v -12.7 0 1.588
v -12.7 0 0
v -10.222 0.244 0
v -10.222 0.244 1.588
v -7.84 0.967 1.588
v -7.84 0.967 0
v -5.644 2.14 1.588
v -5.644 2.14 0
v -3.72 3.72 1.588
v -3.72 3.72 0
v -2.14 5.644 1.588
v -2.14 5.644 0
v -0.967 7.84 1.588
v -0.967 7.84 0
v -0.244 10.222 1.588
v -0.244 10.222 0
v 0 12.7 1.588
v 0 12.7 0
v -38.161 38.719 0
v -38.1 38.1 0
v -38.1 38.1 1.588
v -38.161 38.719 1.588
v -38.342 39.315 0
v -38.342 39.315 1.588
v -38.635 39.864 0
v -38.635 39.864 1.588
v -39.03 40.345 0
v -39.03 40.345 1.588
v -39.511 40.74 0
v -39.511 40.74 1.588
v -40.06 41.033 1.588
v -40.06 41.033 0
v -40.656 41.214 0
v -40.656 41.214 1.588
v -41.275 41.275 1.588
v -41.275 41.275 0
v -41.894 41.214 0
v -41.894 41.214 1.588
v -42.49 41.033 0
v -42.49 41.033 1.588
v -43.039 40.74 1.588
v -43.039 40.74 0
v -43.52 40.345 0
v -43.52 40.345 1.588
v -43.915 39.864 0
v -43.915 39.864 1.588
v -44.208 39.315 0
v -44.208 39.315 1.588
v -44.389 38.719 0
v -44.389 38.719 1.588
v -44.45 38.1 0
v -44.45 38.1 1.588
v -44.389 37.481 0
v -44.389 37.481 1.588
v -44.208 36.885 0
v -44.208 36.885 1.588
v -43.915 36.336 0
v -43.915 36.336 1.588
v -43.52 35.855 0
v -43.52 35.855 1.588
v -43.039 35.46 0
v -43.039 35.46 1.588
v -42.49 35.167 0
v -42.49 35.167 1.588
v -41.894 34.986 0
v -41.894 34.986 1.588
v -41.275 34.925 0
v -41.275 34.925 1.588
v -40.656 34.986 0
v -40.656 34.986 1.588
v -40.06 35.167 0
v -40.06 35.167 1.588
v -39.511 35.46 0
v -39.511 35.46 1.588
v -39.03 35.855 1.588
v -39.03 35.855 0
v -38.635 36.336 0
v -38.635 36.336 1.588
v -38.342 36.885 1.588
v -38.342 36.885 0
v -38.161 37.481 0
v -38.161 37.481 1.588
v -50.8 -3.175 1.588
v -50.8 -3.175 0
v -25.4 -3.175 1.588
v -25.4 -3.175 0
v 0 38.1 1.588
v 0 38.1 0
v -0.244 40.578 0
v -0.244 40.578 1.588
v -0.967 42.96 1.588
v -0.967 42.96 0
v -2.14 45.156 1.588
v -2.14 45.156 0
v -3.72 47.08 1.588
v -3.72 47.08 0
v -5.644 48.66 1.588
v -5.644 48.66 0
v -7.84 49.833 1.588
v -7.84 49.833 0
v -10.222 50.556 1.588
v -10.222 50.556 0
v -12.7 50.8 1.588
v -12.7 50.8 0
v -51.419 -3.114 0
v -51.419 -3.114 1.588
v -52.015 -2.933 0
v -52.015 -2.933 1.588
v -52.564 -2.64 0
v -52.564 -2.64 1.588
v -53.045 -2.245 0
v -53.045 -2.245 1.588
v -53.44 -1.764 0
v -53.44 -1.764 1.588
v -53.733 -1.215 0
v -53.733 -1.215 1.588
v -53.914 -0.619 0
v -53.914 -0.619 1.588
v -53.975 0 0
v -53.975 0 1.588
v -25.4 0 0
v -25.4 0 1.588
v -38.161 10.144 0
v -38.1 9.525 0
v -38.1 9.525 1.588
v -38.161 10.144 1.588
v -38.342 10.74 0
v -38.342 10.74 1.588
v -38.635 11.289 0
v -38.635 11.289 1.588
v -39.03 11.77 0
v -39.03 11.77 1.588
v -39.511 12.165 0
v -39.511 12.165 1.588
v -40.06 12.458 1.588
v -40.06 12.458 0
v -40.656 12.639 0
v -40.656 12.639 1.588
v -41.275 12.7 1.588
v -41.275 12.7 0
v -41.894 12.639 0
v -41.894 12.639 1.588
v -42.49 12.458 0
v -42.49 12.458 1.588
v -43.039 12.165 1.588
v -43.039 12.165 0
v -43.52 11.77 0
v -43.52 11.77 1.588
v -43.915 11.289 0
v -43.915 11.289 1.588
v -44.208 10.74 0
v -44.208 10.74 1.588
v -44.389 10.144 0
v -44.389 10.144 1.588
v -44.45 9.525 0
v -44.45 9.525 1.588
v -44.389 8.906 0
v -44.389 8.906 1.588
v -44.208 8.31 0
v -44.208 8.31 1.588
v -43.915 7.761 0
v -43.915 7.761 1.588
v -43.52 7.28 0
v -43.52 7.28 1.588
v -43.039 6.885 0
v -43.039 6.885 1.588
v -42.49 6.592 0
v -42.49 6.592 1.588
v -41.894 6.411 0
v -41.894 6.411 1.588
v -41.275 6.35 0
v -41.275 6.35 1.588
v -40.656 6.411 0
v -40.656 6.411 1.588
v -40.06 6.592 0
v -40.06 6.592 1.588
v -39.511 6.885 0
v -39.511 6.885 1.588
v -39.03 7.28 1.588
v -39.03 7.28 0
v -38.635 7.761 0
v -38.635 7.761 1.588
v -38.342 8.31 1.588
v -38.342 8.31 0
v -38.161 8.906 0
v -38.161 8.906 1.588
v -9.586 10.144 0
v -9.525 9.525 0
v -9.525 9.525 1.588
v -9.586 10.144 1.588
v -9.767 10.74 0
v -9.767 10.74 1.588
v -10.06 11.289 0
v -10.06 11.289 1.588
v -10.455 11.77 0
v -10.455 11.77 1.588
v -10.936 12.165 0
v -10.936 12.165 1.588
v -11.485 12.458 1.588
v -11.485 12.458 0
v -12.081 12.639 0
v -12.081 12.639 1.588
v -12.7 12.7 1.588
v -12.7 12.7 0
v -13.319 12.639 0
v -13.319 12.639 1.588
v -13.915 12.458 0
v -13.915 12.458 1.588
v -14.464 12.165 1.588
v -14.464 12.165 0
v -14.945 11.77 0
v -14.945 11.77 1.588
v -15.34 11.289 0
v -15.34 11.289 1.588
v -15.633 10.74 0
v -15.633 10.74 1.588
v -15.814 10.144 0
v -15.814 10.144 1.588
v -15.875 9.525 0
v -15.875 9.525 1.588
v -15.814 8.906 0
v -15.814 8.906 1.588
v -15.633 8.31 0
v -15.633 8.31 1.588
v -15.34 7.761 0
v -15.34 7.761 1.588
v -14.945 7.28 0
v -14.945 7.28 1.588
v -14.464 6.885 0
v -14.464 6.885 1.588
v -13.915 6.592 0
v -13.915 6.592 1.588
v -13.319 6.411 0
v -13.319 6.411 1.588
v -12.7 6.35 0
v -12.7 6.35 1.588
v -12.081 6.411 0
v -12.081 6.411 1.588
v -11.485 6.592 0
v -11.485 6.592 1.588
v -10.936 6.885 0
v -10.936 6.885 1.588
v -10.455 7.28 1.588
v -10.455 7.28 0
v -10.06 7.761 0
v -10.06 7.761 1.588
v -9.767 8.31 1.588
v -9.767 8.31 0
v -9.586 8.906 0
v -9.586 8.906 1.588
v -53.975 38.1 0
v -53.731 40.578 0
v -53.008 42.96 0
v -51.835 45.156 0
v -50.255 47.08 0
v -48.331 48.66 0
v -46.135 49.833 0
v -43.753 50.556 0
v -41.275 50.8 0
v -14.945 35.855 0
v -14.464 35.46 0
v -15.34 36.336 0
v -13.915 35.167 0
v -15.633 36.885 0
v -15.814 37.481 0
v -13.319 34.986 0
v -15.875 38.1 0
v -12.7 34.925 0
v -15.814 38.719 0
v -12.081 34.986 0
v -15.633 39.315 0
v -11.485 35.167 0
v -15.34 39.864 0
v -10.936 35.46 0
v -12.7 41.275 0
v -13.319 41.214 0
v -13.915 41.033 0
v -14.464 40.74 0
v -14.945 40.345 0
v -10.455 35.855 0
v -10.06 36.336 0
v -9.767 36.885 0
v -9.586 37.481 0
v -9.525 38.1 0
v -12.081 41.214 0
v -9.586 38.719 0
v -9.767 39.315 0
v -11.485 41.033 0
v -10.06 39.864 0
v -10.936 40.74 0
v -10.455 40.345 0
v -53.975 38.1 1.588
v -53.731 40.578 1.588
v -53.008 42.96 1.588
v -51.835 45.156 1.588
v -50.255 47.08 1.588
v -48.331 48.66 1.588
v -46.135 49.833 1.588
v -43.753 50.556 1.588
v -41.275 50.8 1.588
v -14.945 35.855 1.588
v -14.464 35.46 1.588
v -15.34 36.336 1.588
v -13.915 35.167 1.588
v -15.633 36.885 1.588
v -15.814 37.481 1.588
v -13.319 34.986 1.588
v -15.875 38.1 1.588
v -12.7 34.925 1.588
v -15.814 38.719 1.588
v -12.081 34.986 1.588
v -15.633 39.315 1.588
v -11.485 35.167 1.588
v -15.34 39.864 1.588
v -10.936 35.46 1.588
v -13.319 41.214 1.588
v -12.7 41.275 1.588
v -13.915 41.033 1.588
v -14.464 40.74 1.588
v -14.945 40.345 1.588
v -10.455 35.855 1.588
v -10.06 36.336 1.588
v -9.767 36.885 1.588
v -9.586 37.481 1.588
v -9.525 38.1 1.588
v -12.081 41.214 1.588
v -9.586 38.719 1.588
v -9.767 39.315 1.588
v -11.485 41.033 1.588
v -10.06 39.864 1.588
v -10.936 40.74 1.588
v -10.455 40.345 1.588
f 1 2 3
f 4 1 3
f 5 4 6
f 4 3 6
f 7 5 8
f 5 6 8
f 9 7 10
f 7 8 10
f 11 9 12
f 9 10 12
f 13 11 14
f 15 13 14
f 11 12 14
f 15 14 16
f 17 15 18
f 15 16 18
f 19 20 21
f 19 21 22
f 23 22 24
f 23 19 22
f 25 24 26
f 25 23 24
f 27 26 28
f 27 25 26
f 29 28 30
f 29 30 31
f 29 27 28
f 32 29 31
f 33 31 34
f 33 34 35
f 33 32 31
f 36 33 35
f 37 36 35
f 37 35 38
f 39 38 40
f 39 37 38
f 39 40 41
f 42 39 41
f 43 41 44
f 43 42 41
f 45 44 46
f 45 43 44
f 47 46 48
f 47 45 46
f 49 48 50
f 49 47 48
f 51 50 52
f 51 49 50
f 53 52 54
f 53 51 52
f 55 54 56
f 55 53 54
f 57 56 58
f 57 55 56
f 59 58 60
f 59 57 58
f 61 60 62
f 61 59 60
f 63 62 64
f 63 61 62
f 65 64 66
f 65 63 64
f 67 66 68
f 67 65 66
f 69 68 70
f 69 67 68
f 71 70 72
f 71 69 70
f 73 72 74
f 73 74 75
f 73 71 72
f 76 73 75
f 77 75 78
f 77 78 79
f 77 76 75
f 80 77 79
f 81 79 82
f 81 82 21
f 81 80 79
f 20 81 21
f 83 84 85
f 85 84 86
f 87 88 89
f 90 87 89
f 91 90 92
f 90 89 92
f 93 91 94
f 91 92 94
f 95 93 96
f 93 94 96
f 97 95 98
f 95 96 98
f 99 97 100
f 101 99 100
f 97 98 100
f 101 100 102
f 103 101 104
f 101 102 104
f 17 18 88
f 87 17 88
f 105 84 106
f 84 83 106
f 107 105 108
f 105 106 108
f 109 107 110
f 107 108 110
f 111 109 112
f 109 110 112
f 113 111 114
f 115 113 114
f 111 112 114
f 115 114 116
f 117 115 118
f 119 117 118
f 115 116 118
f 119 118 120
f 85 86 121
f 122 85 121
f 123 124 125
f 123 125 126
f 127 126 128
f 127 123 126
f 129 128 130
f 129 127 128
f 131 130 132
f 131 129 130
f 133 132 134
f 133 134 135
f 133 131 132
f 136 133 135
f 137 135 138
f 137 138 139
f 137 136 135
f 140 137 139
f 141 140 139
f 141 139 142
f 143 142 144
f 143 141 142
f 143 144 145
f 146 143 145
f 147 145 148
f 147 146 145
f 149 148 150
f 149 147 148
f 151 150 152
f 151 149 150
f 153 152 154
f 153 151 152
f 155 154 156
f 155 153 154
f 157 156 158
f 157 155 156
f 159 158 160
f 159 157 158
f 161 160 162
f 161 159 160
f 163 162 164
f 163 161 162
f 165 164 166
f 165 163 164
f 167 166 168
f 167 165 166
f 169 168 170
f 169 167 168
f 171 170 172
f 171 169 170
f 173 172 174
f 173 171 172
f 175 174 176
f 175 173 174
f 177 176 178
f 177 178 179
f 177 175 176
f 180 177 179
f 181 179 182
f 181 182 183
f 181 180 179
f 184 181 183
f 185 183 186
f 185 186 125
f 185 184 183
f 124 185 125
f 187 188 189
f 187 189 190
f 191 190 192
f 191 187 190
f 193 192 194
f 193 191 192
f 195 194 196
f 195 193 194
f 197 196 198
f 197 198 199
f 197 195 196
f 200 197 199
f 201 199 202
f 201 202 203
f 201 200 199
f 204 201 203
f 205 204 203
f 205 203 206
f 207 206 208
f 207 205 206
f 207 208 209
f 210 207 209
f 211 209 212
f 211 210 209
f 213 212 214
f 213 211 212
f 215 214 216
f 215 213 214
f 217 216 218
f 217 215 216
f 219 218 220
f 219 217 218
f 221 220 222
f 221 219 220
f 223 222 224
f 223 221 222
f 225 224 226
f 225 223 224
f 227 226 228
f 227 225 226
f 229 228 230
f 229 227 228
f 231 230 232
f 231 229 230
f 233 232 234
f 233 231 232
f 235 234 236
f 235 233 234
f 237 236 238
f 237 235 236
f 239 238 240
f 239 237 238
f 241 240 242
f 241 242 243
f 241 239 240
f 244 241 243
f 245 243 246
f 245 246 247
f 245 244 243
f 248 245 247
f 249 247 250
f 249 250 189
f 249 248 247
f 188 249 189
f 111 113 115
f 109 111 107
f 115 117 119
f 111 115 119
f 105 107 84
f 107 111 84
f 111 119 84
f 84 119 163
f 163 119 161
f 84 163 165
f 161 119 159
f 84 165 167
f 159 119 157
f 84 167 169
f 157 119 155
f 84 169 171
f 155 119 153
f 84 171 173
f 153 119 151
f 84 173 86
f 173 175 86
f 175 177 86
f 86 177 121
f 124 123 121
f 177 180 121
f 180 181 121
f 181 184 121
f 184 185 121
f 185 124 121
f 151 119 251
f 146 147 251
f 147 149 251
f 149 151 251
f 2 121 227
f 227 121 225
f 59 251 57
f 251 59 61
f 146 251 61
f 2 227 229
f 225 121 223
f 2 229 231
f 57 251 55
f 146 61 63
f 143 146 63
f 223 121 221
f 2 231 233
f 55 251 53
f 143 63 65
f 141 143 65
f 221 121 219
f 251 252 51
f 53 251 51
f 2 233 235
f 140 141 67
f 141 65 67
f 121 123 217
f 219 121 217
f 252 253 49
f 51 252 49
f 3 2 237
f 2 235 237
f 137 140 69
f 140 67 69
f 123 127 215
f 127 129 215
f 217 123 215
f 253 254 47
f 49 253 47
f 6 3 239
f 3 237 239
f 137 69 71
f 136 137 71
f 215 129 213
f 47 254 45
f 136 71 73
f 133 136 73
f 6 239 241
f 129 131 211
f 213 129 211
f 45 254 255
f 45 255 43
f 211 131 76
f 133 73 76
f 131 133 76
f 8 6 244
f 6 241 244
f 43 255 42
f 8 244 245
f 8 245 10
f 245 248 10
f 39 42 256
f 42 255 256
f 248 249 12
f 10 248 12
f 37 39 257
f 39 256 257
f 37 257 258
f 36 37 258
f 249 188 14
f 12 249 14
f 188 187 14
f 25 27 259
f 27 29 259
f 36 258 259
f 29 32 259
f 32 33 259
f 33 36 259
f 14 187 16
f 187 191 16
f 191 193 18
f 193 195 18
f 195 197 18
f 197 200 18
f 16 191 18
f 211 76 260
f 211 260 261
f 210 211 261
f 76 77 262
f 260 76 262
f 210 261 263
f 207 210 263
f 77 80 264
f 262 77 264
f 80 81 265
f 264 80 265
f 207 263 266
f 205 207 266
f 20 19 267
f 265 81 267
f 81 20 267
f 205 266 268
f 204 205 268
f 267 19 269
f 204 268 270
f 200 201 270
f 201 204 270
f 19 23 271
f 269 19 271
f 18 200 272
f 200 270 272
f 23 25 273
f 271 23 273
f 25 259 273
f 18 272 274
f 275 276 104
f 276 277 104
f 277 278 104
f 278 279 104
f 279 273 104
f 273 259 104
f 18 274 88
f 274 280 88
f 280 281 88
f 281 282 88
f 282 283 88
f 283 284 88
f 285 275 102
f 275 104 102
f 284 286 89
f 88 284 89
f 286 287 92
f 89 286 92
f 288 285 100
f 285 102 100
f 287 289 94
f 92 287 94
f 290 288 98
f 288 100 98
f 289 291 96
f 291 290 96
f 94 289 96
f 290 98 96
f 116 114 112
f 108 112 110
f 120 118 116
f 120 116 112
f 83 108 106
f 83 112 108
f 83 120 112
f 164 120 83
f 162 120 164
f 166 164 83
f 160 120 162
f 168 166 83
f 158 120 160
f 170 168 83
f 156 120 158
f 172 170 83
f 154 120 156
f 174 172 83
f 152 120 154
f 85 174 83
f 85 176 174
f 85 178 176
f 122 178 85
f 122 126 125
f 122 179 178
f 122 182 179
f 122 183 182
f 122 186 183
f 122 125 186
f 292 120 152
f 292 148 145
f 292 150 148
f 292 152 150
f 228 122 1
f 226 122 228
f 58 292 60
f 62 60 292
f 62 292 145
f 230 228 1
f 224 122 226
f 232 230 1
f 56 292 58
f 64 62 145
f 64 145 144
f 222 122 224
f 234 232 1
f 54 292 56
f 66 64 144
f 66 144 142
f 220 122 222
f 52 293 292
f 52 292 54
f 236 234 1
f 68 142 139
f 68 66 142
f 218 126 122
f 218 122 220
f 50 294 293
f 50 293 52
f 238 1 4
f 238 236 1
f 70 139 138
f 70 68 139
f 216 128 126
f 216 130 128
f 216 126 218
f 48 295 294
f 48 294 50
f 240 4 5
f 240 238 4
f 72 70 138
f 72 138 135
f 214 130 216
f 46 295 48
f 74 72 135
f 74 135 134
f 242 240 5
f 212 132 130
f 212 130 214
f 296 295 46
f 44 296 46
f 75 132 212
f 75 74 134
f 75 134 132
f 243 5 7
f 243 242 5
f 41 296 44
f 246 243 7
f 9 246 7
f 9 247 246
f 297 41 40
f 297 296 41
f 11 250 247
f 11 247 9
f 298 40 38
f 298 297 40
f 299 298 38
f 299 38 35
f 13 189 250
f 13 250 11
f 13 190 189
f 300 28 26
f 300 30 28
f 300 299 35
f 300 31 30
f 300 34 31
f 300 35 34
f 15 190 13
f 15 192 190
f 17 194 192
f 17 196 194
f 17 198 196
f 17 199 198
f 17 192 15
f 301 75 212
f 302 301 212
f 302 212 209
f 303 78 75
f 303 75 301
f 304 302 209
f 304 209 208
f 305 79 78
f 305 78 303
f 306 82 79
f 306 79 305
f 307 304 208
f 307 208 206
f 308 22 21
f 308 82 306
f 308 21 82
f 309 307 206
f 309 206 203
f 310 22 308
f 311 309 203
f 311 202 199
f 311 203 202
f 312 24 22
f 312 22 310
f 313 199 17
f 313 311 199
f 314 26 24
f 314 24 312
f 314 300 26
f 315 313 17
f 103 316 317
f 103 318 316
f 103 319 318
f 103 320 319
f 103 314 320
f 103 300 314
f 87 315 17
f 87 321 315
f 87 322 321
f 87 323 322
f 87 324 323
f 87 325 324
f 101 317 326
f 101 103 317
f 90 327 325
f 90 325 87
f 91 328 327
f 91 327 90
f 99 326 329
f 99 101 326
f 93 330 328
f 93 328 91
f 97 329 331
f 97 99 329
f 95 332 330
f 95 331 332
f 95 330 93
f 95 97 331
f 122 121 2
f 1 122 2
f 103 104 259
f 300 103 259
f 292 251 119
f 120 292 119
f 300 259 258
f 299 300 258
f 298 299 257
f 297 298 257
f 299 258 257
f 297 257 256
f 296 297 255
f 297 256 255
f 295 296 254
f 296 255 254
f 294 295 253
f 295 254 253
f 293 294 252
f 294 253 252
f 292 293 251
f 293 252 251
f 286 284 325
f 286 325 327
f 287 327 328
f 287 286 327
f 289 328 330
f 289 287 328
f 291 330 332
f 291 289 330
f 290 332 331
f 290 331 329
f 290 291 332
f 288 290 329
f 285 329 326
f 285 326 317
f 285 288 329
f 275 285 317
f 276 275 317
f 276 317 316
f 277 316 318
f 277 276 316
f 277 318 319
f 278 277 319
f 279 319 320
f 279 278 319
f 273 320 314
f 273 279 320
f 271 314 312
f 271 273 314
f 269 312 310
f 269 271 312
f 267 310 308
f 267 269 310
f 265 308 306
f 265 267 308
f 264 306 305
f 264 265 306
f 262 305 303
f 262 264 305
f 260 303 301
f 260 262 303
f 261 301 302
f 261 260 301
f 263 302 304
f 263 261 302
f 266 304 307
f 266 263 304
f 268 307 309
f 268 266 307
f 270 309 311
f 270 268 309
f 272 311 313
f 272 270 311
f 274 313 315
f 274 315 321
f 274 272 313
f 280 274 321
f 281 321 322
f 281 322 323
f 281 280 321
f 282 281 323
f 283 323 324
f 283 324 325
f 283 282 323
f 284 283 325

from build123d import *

# Parameters (mm, degrees)
SKETCH1_R           = 3.175
BOSS_EXTRUDE1_DEPTH = 1.5875
FILLET1_R           = 3.175


with BuildPart() as part:
    # Sketch1 → Boss-Extrude1 (new body)
    with BuildSketch(Plane.XY):
        with BuildLine():
            ThreePointArc((-12.7, 0), (-3.719743879, 3.719743879), (0, 12.7))
            Line((0, 12.7), (0, 38.1))
            ThreePointArc((0, 38.1), (-3.719743879, 47.080256121), (-12.7, 50.8))
            Line((-12.7, 50.8), (-41.275, 50.8))
            ThreePointArc((-41.275, 50.8), (-50.255256121, 47.080256121), (-53.975, 38.1))
            Line((-53.975, 38.1), (-53.975, 0))
            Line((-53.975, 0), (-53.975, -3.175))
            Line((-53.975, -3.175), (-25.4, -3.175))
            Line((-25.4, -3.175), (-25.4, 0))
            Line((-25.4, 0), (-12.7, 0))
        make_face()
        with Locations((-41.275, 9.525)):
            Circle(SKETCH1_R, mode=Mode.SUBTRACT)
        with Locations((-12.7, 9.525)):
            Circle(SKETCH1_R, mode=Mode.SUBTRACT)
        with Locations((-41.275, 38.1)):
            Circle(SKETCH1_R, mode=Mode.SUBTRACT)
        with Locations((-12.7, 38.1)):
            Circle(SKETCH1_R, mode=Mode.SUBTRACT)
    extrude(amount=BOSS_EXTRUDE1_DEPTH)

    # Fillet1
    fillet1_edges = [part.edges().sort_by_distance(p)[0] for p in [
        (-53.975, -3.175, 0.79375),
    ]]
    fillet(fillet1_edges, radius=FILLET1_R)


solid = part.part
